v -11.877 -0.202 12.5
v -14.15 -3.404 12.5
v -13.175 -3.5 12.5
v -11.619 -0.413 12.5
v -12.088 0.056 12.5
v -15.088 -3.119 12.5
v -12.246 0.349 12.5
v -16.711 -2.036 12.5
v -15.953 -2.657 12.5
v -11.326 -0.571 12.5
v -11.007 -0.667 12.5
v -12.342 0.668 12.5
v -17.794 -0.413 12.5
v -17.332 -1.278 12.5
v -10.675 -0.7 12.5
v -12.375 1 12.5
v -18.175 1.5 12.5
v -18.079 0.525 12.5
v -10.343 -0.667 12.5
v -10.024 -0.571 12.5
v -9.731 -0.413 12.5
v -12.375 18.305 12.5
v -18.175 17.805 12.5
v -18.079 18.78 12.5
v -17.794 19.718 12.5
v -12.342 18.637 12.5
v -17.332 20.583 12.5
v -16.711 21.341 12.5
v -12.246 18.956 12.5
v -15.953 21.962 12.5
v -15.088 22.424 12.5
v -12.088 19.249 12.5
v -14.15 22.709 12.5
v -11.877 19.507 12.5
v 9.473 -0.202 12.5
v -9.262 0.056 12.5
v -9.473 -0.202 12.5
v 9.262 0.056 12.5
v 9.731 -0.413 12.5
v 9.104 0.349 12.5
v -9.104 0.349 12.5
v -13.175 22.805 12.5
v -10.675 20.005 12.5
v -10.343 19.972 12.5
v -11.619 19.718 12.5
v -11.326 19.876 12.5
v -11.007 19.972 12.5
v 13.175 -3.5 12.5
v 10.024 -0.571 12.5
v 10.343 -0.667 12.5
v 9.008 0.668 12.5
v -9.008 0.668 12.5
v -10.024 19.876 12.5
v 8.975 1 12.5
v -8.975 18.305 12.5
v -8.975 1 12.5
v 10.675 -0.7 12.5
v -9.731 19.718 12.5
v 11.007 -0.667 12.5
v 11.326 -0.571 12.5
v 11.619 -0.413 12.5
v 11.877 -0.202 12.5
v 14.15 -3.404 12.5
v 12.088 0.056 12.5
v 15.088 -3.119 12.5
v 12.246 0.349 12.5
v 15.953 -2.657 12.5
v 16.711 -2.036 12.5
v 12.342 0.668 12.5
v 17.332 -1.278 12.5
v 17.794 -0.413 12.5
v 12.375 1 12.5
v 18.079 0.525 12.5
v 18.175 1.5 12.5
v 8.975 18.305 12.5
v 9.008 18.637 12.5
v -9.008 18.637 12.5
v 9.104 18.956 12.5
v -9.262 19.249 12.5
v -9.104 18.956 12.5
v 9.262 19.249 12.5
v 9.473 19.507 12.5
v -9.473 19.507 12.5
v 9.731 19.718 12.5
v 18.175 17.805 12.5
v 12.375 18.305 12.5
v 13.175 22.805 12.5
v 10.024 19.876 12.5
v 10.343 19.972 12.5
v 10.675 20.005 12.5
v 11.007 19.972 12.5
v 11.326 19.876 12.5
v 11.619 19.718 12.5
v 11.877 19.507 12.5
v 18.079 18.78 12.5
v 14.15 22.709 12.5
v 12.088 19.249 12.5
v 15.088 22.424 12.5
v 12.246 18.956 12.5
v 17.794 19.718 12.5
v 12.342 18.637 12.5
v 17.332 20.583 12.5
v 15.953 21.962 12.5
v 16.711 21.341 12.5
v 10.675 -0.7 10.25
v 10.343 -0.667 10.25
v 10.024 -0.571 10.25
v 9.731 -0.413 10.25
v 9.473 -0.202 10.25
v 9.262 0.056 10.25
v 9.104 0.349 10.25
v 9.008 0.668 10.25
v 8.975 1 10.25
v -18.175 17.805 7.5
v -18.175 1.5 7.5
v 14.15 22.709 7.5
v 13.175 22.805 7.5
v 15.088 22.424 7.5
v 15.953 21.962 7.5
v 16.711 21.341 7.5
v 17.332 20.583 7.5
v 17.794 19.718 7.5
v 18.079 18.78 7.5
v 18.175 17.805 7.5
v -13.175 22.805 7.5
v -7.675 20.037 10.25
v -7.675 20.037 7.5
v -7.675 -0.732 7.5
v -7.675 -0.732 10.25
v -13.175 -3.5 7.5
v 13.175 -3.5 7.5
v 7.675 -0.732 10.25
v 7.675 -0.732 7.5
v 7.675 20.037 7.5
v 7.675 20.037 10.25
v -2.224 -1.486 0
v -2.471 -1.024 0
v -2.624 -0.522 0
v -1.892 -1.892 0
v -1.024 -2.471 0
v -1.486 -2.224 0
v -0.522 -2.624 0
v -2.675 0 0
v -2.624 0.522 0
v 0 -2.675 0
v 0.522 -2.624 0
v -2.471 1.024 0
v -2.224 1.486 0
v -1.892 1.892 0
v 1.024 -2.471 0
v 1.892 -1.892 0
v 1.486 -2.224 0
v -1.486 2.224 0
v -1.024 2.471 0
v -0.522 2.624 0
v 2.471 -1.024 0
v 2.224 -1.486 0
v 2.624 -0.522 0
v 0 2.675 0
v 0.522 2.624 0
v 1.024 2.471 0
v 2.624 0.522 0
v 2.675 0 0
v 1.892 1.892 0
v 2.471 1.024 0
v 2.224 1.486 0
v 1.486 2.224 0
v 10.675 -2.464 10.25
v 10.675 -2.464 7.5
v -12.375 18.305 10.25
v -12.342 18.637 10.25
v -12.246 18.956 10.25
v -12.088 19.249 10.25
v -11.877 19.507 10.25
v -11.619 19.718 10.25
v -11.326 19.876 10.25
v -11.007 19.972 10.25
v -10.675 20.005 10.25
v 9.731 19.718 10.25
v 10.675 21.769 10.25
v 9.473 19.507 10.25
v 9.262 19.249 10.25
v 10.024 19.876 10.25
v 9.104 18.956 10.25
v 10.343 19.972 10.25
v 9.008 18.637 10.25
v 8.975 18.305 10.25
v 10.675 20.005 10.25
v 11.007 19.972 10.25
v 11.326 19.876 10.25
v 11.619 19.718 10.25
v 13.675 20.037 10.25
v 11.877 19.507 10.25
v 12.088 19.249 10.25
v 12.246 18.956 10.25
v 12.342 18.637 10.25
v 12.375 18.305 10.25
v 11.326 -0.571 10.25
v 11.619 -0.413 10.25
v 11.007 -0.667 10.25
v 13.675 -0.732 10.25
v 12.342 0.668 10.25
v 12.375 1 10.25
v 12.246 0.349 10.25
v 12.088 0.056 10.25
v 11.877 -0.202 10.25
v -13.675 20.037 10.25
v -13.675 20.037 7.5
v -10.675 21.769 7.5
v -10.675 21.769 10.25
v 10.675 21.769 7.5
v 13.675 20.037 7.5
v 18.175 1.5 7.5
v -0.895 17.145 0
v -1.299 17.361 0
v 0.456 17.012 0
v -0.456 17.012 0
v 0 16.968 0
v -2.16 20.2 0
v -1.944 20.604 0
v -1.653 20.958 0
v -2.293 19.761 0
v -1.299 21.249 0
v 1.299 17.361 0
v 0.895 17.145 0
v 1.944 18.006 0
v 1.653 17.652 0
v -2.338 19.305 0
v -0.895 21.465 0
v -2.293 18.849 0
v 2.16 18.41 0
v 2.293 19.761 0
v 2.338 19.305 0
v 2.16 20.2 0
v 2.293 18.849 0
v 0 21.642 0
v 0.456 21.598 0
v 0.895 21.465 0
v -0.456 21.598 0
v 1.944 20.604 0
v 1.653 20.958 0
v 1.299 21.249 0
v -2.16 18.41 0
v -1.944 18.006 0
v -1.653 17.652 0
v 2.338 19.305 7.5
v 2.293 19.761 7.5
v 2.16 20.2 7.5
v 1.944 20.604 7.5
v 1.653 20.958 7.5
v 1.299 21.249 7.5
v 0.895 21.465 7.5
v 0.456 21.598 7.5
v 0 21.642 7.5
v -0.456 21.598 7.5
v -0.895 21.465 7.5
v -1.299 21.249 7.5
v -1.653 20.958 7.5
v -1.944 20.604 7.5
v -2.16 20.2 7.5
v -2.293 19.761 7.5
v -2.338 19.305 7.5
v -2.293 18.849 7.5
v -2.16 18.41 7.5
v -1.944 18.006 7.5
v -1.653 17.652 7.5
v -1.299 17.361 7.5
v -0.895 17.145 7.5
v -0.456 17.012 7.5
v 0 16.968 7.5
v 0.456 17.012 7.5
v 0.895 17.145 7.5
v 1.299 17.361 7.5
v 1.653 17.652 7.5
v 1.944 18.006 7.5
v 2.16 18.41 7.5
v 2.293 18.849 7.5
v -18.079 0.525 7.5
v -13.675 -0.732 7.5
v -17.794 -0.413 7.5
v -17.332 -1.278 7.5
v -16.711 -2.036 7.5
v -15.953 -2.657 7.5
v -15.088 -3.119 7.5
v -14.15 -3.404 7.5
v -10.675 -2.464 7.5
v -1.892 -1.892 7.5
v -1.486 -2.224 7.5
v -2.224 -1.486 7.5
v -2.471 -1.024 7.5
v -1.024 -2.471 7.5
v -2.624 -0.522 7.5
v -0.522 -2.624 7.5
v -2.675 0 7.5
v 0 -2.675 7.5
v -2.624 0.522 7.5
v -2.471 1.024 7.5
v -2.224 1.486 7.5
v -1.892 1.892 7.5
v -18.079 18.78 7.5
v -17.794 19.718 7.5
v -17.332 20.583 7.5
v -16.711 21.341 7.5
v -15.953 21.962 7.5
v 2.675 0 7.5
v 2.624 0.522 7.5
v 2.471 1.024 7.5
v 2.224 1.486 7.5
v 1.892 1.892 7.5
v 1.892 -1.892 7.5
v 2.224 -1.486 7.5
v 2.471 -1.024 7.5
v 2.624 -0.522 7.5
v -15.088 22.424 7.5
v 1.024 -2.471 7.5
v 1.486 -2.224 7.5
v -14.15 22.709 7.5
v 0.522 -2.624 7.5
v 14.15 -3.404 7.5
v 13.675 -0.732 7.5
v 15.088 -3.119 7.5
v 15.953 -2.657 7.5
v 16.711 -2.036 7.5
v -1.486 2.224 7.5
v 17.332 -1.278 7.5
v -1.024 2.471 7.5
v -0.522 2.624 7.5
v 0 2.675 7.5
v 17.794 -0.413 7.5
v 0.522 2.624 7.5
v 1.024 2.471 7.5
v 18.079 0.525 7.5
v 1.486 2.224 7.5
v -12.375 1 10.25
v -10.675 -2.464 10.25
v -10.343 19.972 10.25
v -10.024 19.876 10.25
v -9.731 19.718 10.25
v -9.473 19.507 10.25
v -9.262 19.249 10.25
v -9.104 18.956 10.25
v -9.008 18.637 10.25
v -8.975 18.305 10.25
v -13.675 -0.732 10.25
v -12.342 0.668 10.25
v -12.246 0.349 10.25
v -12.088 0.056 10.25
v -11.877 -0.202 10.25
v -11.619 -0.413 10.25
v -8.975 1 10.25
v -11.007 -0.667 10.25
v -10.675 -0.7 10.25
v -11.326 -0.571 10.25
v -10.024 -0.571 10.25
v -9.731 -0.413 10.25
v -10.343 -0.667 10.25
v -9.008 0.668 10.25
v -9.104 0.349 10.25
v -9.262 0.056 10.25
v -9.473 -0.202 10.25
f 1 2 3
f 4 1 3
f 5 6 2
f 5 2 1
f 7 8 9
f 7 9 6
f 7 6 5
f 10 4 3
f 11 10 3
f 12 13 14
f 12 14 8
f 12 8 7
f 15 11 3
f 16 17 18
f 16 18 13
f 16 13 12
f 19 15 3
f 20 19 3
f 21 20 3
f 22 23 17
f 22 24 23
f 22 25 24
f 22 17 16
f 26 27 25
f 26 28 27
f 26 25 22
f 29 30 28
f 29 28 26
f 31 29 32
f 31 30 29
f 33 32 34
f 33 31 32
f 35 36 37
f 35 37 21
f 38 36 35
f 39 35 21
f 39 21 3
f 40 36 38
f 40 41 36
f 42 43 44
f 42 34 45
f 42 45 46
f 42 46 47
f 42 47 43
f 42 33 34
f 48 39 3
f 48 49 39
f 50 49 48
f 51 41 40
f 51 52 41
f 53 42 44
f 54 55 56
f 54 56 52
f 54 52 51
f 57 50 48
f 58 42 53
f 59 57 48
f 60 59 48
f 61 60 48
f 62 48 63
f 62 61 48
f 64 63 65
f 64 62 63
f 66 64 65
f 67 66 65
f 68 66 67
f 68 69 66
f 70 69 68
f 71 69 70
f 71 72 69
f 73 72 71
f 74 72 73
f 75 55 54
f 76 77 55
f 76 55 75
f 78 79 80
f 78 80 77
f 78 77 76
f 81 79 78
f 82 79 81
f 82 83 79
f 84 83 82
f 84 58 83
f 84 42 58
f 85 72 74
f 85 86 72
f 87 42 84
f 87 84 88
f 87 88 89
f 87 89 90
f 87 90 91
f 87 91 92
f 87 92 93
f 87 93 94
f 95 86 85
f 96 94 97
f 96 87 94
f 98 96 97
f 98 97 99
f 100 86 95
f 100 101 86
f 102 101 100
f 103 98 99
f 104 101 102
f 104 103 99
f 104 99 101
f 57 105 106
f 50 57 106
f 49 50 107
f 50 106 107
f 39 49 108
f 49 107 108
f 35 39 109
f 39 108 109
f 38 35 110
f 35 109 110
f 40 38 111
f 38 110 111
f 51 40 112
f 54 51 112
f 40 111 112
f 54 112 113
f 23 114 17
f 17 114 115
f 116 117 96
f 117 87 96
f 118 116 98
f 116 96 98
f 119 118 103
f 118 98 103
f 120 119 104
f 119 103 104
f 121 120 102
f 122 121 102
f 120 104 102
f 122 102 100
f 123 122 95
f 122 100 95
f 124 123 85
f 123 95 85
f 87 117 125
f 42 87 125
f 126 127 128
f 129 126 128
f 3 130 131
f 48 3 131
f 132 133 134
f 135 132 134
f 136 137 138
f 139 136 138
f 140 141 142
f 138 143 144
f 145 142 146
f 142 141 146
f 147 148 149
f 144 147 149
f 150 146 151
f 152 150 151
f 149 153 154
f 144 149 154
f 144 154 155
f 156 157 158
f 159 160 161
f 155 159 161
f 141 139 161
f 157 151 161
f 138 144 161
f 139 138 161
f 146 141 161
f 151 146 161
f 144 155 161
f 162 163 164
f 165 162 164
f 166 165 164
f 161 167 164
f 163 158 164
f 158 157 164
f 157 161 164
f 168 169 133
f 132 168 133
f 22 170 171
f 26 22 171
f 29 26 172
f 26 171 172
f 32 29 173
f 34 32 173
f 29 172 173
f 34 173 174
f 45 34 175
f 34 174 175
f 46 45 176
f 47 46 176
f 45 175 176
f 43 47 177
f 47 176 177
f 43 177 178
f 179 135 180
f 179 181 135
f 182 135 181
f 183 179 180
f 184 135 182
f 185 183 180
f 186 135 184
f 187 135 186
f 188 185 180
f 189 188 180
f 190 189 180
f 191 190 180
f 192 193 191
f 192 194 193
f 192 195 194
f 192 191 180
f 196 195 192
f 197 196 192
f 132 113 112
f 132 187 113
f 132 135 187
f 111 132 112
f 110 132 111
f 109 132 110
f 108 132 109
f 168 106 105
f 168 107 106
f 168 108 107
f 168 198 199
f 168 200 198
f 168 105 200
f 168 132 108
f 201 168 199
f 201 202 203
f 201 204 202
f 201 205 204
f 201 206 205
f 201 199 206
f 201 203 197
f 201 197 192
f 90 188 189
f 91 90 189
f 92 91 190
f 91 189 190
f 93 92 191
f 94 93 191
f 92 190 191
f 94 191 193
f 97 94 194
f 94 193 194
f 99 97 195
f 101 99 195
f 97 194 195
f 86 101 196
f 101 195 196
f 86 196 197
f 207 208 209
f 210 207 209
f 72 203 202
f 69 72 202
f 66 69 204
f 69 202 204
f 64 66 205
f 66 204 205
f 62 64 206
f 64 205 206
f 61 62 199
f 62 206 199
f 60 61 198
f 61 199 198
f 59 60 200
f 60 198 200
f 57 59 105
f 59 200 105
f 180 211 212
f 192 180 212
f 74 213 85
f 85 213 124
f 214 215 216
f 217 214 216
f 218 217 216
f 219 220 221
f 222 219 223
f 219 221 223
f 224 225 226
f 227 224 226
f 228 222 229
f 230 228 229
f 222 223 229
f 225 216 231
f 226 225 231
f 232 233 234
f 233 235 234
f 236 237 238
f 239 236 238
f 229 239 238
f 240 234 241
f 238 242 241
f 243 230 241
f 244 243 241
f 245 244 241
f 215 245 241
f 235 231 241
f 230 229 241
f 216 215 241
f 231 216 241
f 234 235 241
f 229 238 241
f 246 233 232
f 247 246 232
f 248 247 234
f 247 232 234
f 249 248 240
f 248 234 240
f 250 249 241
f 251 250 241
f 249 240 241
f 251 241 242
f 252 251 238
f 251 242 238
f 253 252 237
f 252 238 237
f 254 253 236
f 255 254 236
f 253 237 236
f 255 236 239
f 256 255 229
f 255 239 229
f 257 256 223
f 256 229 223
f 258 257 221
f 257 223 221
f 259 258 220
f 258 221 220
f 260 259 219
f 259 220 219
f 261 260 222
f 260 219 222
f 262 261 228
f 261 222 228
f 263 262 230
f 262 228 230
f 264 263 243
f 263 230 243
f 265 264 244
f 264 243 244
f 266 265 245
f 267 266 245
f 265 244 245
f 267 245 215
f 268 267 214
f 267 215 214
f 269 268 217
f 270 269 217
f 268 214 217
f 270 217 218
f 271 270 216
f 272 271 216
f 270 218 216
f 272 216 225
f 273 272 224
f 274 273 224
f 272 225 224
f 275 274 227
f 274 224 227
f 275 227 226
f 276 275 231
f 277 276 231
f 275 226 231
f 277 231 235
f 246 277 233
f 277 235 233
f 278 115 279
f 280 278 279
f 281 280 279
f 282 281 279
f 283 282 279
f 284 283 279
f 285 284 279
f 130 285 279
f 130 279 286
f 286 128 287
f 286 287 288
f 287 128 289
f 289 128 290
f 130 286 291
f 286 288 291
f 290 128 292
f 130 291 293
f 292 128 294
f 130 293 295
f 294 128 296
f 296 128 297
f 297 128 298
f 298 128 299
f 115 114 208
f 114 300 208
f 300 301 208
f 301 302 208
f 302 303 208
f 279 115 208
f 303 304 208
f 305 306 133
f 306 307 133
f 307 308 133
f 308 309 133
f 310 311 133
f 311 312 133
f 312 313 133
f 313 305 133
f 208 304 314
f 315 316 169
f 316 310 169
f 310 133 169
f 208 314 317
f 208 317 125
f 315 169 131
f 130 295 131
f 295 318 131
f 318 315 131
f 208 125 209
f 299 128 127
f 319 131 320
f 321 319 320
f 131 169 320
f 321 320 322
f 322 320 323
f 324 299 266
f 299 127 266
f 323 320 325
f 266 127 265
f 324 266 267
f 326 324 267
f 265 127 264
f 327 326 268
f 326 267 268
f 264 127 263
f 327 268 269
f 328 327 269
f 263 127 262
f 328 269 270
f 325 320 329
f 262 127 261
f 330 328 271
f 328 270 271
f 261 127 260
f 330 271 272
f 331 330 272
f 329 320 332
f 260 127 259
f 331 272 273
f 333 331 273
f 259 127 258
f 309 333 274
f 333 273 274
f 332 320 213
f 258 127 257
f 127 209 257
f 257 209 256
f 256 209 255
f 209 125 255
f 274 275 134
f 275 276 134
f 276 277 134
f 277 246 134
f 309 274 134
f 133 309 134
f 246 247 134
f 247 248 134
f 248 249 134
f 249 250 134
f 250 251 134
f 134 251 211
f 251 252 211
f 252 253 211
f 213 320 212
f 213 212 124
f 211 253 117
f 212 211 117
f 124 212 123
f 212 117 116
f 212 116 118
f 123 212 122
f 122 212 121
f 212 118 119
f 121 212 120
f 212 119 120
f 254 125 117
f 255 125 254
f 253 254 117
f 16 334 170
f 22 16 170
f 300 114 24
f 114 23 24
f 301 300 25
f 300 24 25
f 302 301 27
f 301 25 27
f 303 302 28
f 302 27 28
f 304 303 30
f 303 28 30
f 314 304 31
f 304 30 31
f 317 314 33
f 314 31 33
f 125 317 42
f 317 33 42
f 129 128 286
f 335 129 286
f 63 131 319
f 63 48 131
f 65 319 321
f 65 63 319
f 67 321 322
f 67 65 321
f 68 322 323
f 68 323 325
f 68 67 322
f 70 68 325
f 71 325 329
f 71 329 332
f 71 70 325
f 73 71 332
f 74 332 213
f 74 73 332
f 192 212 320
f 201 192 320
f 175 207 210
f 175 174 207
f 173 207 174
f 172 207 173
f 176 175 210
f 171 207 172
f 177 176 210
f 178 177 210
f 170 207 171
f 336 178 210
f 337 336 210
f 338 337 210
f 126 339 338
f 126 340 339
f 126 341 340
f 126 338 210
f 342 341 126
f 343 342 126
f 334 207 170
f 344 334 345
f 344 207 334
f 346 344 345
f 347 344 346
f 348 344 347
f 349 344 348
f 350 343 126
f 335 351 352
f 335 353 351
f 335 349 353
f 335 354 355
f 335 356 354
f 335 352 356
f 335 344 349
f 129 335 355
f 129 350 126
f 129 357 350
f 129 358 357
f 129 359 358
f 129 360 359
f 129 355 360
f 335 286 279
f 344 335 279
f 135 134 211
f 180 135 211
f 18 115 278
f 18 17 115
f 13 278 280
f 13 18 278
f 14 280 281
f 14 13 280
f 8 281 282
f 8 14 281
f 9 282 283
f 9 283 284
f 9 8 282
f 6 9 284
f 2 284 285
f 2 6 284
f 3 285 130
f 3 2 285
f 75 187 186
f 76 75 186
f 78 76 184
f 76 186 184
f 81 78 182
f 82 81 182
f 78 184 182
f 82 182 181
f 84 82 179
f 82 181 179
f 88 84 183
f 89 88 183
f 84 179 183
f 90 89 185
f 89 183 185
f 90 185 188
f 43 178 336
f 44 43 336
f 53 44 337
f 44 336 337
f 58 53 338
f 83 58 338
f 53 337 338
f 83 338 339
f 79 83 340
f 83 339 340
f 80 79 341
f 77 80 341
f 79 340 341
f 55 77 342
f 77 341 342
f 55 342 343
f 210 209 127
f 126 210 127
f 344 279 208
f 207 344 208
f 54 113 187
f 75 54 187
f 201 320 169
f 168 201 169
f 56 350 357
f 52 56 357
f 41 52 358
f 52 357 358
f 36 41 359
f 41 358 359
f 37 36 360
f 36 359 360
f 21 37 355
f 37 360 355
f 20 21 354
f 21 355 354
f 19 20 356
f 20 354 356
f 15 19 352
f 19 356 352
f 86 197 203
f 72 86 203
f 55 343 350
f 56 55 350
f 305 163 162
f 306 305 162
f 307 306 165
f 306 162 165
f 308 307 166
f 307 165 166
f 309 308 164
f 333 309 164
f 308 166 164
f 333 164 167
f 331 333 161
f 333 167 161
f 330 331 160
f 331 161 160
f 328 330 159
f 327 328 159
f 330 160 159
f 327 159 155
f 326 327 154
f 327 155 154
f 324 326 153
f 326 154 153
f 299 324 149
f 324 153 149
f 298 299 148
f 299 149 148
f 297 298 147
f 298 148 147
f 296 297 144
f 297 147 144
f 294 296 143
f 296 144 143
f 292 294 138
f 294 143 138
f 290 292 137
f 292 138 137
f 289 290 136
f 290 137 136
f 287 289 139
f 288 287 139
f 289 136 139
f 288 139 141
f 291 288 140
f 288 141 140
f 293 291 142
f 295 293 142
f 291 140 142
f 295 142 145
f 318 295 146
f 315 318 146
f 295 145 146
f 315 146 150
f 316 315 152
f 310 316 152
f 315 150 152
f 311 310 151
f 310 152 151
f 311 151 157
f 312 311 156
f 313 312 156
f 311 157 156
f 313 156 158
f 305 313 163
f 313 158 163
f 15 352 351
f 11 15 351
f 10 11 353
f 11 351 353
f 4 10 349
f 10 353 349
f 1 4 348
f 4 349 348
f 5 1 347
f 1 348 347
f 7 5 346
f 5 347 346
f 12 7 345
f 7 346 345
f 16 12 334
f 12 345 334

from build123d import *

# Parameters (mm, degrees)
F1_R     = 2.3375
F2_DEPTH = 7.5
F1_R_2   = 2.675
F4_DEPTH = 5
F5_R     = 5
F7_DEPTH = 2.75


# Not quite as in the source:
# - a feature names something its author has since deleted; it is built from what else it names


with BuildPart() as f2:
    # F1 (on Top) → F2 (new body)
    with BuildSketch(Plane.XY):
        with Locations((0, 19.305)):
            Circle(F1_R)
    extrude(amount=F2_DEPTH)



with BuildPart() as f2b:
    # F1 (on Top) → F2, piece 2 (new body)
    with BuildSketch(Plane.XY):
        Circle(F1_R_2)
    extrude(amount=F2_DEPTH)


with BuildPart() as f2_1:
    add(f2.part)

    add(f2b.part)  # F4 merges F2b
    # F3 (on face) → F4 (join)
    with BuildSketch(Plane.XY.offset(7.5)):
        with BuildLine():
            Line((0, 21.6425), (0, 22.805))
            Line((0, 22.805), (-10.675, 22.805))
            Line((-10.675, 22.805), (-10.675, 20.005))
            ThreePointArc((-10.675, 20.005), (-9.472918472, 19.507081528), (-8.975, 18.305))
            Line((-8.975, 18.305), (-8.975, 1))
            ThreePointArc((-8.975, 1), (-9.472918472, -0.202081528), (-10.675, -0.7))
            Line((-10.675, -0.7), (-10.675, -3.5))
            Line((-10.675, -3.5), (0, -3.5))
            Line((0, -3.5), (0, 16.9675))
            ThreePointArc((0, 16.9675), (-2.3375, 19.305), (0, 21.6425))
        make_face()
        with BuildLine():
            Line((10.675, 22.805), (0, 22.805))
            Line((0, 22.805), (0, 21.6425))
            ThreePointArc((0, 21.6425), (1.652862101, 20.957862101), (2.3375, 19.305))
            ThreePointArc((2.3375, 19.305), (1.652862101, 17.652137899), (0, 16.9675))
            Line((0, 16.9675), (0, -3.5))
            Line((0, -3.5), (10.675, -3.5))
            Line((10.675, -3.5), (10.675, -0.7))
            ThreePointArc((10.675, -0.7), (9.472918472, -0.202081528), (8.975, 1))
            Line((8.975, 1), (8.975, 18.305))
            ThreePointArc((8.975, 18.305), (9.472918472, 19.507081528), (10.675, 20.005))
            Line((10.675, 20.005), (10.675, 22.805))
        make_face()
        with BuildLine():
            Line((0, 16.9675), (0, 21.6425))
            ThreePointArc((0, 21.6425), (-2.3375, 19.305), (0, 16.9675))
        make_face()
        with BuildLine():
            ThreePointArc((2.3375, 19.305), (1.652862101, 20.957862101), (0, 21.6425))
            Line((0, 21.6425), (0, 16.9675))
            ThreePointArc((0, 16.9675), (1.652862101, 17.652137899), (2.3375, 19.305))
        make_face()
        with BuildLine():
            Line((-10.675, 20.005), (-10.675, 22.805))
            Line((-10.675, 22.805), (-18.175, 22.805))
            Line((-18.175, 22.805), (-18.175, -3.5))
            Line((-18.175, -3.5), (-10.675, -3.5))
            Line((-10.675, -3.5), (-10.675, -0.7))
            ThreePointArc((-10.675, -0.7), (-11.877081528, -0.202081528), (-12.375, 1))
            Line((-12.375, 1), (-12.375, 18.305))
            ThreePointArc((-12.375, 18.305), (-11.877081528, 19.507081528), (-10.675, 20.005))
        make_face()
        with BuildLine():
            Line((18.175, 22.805), (10.675, 22.805))
            Line((10.675, 22.805), (10.675, 20.005))
            ThreePointArc((10.675, 20.005), (11.877081528, 19.507081528), (12.375, 18.305))
            Line((12.375, 18.305), (12.375, 1))
            ThreePointArc((12.375, 1), (11.877081528, -0.202081528), (10.675, -0.7))
            Line((10.675, -0.7), (10.675, -3.5))
            Line((10.675, -3.5), (18.175, -3.5))
            Line((18.175, -3.5), (18.175, 22.805))
        make_face()
    extrude(amount=F4_DEPTH)

    # F5
    f5_edges = [f2_1.edges().sort_by_distance(p)[0] for p in [
        (-18.175, 22.805, 10),
        (-18.175, -3.5, 10),
        (18.175, -3.5, 10),
        (18.175, 22.805, 10),
    ]]
    fillet(f5_edges, radius=F5_R)

    # F6 (on face) → F7 (cut)
    with BuildSketch(Plane(origin=(0, 0, 7.5), x_dir=(1, 0, 0), z_dir=(0, 0, -1))):
        Polygon((-7.675, 0.7320508076), (-10.675, 2.4641016151), (-13.675, 0.7320508076), (-13.675, -2.7320508076), (-10.675, -4.4641016151), (-7.675, -2.7320508076), align=None)
        Polygon((-7.675, -16.5729491924), (-7.675, -2.7320508076), (-10.675, -4.4641016151), (-13.675, -2.7320508076), (-13.675, -16.5729491924), (-10.675, -14.8408983849), align=None)
        Polygon((-7.675, -20.0370508076), (-7.675, -16.5729491924), (-10.675, -14.8408983849), (-13.675, -16.5729491924), (-13.675, -20.0370508076), (-10.675, -21.7691016151), align=None)
        Polygon((10.675, 2.4641016151), (7.675, 0.7320508076), (7.675, -2.7320508076), (10.675, -4.4641016151), (13.675, -2.7320508076), (13.675, 0.7320508076), align=None)
        Polygon((10.675, -4.4641016151), (7.675, -2.7320508076), (7.675, -16.5729491924), (10.675, -14.8408983849), (13.675, -16.5729491924), (13.675, -2.7320508076), align=None)
        Polygon((10.675, -14.8408983849), (7.675, -16.5729491924), (7.675, -20.0370508076), (10.675, -21.7691016151), (13.675, -20.0370508076), (13.675, -16.5729491924), align=None)
    extrude(amount=-F7_DEPTH, mode=Mode.SUBTRACT)


solid = f2_1.part
